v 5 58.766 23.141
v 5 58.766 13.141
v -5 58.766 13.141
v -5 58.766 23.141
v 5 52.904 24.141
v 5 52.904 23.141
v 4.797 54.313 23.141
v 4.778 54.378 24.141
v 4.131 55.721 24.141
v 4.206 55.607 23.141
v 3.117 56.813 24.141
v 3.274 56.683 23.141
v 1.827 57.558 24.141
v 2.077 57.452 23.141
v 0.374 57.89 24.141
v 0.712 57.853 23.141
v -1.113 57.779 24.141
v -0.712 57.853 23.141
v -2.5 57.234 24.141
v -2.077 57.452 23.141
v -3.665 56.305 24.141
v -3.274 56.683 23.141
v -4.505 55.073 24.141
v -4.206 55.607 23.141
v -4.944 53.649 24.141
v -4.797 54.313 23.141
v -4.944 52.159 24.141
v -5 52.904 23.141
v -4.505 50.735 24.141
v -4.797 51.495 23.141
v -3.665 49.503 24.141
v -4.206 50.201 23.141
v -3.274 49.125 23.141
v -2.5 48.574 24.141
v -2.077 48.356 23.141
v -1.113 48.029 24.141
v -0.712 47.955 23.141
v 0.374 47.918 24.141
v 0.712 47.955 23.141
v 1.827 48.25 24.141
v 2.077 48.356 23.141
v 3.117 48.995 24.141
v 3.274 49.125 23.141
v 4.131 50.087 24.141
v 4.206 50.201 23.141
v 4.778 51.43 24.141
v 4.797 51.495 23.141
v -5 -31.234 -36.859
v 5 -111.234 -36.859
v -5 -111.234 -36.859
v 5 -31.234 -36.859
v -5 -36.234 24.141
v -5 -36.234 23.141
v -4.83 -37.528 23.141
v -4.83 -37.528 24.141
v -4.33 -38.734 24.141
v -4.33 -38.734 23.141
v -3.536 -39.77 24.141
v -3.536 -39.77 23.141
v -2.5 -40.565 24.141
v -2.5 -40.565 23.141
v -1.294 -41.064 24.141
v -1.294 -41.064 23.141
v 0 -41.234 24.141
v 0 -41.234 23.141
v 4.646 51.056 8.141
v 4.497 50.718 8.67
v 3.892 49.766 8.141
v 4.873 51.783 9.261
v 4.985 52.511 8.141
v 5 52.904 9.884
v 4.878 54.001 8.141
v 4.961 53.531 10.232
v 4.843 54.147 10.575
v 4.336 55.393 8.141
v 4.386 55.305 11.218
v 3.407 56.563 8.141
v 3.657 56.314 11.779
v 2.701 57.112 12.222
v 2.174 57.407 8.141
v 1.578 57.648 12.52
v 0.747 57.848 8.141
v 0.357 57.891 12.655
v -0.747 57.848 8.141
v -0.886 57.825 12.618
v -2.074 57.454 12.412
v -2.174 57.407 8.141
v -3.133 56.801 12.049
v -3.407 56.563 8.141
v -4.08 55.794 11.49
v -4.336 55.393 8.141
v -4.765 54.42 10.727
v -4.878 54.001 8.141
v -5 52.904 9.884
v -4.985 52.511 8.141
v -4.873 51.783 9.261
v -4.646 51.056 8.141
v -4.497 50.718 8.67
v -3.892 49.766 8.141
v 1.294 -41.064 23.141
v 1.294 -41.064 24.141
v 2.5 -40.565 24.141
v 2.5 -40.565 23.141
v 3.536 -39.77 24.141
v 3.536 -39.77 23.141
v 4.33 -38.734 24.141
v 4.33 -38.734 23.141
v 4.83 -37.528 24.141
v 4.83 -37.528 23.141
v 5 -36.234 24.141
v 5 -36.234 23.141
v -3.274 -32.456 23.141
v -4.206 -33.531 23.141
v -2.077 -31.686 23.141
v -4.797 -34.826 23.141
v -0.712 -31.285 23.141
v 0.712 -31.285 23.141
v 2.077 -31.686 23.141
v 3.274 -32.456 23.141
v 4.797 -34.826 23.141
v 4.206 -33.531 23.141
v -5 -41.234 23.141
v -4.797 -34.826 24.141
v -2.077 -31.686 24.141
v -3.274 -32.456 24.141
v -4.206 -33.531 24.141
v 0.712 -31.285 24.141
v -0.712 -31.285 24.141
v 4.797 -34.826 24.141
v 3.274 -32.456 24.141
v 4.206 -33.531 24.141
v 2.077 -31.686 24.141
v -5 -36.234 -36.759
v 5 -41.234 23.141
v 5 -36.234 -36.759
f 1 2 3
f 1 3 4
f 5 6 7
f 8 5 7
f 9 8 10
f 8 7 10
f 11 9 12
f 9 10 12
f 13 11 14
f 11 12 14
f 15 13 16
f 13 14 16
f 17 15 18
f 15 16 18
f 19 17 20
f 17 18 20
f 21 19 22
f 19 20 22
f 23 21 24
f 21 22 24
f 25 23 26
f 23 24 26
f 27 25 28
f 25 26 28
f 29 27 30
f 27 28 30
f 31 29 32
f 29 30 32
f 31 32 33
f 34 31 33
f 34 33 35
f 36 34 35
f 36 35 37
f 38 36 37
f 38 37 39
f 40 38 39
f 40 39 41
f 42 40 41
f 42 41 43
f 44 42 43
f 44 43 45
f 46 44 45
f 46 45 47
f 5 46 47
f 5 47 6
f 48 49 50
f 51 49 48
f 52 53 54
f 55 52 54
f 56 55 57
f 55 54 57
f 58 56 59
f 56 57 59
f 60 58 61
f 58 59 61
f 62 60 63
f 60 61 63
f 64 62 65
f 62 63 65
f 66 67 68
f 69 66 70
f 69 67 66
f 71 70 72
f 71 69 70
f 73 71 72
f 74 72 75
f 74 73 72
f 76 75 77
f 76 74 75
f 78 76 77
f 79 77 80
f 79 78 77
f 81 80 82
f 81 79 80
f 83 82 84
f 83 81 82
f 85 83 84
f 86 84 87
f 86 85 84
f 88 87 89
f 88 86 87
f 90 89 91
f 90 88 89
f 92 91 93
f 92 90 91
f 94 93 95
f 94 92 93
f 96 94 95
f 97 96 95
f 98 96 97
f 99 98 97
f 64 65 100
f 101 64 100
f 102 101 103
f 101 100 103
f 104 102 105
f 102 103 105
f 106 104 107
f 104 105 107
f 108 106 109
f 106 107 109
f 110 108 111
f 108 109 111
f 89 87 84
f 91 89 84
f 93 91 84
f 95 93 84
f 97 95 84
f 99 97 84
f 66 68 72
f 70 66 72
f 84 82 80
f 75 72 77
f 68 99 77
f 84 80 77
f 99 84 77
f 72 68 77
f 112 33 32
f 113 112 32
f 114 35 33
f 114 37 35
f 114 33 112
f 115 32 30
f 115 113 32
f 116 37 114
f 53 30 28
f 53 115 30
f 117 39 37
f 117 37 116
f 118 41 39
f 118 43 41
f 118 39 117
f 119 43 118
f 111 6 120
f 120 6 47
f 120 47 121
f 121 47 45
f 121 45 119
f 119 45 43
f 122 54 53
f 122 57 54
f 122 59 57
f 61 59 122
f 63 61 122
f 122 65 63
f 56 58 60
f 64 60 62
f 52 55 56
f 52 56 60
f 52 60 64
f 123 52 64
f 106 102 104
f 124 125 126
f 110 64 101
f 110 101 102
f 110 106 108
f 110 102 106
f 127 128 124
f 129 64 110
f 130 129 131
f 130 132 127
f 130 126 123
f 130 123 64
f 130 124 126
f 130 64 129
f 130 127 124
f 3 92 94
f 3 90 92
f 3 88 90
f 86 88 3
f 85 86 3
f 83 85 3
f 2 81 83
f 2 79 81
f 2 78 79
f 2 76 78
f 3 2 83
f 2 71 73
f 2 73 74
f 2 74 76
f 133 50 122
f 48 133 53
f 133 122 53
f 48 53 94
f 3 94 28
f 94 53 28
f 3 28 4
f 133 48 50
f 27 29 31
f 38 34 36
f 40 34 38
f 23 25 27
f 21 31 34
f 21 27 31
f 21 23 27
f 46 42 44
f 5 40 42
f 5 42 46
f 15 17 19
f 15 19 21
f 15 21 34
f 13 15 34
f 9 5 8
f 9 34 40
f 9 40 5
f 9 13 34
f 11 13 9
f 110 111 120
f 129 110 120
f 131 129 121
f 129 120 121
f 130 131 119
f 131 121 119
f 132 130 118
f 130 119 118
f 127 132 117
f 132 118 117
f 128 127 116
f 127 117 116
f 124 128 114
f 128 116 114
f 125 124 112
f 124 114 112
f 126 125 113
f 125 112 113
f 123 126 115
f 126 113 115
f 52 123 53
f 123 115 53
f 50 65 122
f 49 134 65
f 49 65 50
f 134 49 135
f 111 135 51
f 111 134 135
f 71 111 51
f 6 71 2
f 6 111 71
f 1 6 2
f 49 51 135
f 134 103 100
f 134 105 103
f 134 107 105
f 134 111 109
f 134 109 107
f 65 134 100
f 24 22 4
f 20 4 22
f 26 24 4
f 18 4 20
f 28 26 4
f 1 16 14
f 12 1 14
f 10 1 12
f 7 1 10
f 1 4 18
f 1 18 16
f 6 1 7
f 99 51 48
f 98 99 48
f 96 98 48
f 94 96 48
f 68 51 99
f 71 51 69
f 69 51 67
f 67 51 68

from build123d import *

# Parameters (mm, degrees)
F1_DEPTH      = 5
F3_DEPTH      = 1
F3_DEPTH_BACK = 15
F5_DEPTH      = 1
F5_DEPTH_BACK = 59.9


with BuildPart() as f1:
    # F0 (on Right) → F1 (new body, symmetric)
    with BuildSketch(Plane.YZ):
        Polygon((-111.234378, -36.859374), (-41.234378, -36.859374), (-41.234378, 23.140626), align=None)
        Polygon((-41.234378, 23.140626), (-41.234378, -36.859374), (-31.234378, -36.859374), (58.765622, 13.140626), (58.765622, 23.140626), align=None)
    extrude(amount=F1_DEPTH, both=True)

    # F2 (on face) → F3 (join, two sides)
    with BuildSketch(Plane.XY.offset(23.140626)) as f3_sk:
        with BuildLine():
            ThreePointArc((-5, 52.904069), (0, 47.904069), (5, 52.904069))
            ThreePointArc((5, 52.904069), (0, 57.904069), (-5, 52.904069))
        make_face()
    extrude(amount=F3_DEPTH)
    extrude(f3_sk.sketch, amount=-F3_DEPTH_BACK)

    # F4 (on face) → F5 (join, two sides)
    with BuildSketch(Plane.XY.offset(23.140626)) as f5_sk:
        with BuildLine():
            ThreePointArc((0, -41.234378), (3.535534, -39.769912), (5, -36.234378))
            ThreePointArc((5, -36.234378), (0, -31.234378), (-5, -36.234378))
            ThreePointArc((-5, -36.234378), (-3.535534, -39.769912), (0, -41.234378))
        make_face()
    extrude(amount=F5_DEPTH)
    extrude(f5_sk.sketch, amount=-F5_DEPTH_BACK)


solid = f1.part
